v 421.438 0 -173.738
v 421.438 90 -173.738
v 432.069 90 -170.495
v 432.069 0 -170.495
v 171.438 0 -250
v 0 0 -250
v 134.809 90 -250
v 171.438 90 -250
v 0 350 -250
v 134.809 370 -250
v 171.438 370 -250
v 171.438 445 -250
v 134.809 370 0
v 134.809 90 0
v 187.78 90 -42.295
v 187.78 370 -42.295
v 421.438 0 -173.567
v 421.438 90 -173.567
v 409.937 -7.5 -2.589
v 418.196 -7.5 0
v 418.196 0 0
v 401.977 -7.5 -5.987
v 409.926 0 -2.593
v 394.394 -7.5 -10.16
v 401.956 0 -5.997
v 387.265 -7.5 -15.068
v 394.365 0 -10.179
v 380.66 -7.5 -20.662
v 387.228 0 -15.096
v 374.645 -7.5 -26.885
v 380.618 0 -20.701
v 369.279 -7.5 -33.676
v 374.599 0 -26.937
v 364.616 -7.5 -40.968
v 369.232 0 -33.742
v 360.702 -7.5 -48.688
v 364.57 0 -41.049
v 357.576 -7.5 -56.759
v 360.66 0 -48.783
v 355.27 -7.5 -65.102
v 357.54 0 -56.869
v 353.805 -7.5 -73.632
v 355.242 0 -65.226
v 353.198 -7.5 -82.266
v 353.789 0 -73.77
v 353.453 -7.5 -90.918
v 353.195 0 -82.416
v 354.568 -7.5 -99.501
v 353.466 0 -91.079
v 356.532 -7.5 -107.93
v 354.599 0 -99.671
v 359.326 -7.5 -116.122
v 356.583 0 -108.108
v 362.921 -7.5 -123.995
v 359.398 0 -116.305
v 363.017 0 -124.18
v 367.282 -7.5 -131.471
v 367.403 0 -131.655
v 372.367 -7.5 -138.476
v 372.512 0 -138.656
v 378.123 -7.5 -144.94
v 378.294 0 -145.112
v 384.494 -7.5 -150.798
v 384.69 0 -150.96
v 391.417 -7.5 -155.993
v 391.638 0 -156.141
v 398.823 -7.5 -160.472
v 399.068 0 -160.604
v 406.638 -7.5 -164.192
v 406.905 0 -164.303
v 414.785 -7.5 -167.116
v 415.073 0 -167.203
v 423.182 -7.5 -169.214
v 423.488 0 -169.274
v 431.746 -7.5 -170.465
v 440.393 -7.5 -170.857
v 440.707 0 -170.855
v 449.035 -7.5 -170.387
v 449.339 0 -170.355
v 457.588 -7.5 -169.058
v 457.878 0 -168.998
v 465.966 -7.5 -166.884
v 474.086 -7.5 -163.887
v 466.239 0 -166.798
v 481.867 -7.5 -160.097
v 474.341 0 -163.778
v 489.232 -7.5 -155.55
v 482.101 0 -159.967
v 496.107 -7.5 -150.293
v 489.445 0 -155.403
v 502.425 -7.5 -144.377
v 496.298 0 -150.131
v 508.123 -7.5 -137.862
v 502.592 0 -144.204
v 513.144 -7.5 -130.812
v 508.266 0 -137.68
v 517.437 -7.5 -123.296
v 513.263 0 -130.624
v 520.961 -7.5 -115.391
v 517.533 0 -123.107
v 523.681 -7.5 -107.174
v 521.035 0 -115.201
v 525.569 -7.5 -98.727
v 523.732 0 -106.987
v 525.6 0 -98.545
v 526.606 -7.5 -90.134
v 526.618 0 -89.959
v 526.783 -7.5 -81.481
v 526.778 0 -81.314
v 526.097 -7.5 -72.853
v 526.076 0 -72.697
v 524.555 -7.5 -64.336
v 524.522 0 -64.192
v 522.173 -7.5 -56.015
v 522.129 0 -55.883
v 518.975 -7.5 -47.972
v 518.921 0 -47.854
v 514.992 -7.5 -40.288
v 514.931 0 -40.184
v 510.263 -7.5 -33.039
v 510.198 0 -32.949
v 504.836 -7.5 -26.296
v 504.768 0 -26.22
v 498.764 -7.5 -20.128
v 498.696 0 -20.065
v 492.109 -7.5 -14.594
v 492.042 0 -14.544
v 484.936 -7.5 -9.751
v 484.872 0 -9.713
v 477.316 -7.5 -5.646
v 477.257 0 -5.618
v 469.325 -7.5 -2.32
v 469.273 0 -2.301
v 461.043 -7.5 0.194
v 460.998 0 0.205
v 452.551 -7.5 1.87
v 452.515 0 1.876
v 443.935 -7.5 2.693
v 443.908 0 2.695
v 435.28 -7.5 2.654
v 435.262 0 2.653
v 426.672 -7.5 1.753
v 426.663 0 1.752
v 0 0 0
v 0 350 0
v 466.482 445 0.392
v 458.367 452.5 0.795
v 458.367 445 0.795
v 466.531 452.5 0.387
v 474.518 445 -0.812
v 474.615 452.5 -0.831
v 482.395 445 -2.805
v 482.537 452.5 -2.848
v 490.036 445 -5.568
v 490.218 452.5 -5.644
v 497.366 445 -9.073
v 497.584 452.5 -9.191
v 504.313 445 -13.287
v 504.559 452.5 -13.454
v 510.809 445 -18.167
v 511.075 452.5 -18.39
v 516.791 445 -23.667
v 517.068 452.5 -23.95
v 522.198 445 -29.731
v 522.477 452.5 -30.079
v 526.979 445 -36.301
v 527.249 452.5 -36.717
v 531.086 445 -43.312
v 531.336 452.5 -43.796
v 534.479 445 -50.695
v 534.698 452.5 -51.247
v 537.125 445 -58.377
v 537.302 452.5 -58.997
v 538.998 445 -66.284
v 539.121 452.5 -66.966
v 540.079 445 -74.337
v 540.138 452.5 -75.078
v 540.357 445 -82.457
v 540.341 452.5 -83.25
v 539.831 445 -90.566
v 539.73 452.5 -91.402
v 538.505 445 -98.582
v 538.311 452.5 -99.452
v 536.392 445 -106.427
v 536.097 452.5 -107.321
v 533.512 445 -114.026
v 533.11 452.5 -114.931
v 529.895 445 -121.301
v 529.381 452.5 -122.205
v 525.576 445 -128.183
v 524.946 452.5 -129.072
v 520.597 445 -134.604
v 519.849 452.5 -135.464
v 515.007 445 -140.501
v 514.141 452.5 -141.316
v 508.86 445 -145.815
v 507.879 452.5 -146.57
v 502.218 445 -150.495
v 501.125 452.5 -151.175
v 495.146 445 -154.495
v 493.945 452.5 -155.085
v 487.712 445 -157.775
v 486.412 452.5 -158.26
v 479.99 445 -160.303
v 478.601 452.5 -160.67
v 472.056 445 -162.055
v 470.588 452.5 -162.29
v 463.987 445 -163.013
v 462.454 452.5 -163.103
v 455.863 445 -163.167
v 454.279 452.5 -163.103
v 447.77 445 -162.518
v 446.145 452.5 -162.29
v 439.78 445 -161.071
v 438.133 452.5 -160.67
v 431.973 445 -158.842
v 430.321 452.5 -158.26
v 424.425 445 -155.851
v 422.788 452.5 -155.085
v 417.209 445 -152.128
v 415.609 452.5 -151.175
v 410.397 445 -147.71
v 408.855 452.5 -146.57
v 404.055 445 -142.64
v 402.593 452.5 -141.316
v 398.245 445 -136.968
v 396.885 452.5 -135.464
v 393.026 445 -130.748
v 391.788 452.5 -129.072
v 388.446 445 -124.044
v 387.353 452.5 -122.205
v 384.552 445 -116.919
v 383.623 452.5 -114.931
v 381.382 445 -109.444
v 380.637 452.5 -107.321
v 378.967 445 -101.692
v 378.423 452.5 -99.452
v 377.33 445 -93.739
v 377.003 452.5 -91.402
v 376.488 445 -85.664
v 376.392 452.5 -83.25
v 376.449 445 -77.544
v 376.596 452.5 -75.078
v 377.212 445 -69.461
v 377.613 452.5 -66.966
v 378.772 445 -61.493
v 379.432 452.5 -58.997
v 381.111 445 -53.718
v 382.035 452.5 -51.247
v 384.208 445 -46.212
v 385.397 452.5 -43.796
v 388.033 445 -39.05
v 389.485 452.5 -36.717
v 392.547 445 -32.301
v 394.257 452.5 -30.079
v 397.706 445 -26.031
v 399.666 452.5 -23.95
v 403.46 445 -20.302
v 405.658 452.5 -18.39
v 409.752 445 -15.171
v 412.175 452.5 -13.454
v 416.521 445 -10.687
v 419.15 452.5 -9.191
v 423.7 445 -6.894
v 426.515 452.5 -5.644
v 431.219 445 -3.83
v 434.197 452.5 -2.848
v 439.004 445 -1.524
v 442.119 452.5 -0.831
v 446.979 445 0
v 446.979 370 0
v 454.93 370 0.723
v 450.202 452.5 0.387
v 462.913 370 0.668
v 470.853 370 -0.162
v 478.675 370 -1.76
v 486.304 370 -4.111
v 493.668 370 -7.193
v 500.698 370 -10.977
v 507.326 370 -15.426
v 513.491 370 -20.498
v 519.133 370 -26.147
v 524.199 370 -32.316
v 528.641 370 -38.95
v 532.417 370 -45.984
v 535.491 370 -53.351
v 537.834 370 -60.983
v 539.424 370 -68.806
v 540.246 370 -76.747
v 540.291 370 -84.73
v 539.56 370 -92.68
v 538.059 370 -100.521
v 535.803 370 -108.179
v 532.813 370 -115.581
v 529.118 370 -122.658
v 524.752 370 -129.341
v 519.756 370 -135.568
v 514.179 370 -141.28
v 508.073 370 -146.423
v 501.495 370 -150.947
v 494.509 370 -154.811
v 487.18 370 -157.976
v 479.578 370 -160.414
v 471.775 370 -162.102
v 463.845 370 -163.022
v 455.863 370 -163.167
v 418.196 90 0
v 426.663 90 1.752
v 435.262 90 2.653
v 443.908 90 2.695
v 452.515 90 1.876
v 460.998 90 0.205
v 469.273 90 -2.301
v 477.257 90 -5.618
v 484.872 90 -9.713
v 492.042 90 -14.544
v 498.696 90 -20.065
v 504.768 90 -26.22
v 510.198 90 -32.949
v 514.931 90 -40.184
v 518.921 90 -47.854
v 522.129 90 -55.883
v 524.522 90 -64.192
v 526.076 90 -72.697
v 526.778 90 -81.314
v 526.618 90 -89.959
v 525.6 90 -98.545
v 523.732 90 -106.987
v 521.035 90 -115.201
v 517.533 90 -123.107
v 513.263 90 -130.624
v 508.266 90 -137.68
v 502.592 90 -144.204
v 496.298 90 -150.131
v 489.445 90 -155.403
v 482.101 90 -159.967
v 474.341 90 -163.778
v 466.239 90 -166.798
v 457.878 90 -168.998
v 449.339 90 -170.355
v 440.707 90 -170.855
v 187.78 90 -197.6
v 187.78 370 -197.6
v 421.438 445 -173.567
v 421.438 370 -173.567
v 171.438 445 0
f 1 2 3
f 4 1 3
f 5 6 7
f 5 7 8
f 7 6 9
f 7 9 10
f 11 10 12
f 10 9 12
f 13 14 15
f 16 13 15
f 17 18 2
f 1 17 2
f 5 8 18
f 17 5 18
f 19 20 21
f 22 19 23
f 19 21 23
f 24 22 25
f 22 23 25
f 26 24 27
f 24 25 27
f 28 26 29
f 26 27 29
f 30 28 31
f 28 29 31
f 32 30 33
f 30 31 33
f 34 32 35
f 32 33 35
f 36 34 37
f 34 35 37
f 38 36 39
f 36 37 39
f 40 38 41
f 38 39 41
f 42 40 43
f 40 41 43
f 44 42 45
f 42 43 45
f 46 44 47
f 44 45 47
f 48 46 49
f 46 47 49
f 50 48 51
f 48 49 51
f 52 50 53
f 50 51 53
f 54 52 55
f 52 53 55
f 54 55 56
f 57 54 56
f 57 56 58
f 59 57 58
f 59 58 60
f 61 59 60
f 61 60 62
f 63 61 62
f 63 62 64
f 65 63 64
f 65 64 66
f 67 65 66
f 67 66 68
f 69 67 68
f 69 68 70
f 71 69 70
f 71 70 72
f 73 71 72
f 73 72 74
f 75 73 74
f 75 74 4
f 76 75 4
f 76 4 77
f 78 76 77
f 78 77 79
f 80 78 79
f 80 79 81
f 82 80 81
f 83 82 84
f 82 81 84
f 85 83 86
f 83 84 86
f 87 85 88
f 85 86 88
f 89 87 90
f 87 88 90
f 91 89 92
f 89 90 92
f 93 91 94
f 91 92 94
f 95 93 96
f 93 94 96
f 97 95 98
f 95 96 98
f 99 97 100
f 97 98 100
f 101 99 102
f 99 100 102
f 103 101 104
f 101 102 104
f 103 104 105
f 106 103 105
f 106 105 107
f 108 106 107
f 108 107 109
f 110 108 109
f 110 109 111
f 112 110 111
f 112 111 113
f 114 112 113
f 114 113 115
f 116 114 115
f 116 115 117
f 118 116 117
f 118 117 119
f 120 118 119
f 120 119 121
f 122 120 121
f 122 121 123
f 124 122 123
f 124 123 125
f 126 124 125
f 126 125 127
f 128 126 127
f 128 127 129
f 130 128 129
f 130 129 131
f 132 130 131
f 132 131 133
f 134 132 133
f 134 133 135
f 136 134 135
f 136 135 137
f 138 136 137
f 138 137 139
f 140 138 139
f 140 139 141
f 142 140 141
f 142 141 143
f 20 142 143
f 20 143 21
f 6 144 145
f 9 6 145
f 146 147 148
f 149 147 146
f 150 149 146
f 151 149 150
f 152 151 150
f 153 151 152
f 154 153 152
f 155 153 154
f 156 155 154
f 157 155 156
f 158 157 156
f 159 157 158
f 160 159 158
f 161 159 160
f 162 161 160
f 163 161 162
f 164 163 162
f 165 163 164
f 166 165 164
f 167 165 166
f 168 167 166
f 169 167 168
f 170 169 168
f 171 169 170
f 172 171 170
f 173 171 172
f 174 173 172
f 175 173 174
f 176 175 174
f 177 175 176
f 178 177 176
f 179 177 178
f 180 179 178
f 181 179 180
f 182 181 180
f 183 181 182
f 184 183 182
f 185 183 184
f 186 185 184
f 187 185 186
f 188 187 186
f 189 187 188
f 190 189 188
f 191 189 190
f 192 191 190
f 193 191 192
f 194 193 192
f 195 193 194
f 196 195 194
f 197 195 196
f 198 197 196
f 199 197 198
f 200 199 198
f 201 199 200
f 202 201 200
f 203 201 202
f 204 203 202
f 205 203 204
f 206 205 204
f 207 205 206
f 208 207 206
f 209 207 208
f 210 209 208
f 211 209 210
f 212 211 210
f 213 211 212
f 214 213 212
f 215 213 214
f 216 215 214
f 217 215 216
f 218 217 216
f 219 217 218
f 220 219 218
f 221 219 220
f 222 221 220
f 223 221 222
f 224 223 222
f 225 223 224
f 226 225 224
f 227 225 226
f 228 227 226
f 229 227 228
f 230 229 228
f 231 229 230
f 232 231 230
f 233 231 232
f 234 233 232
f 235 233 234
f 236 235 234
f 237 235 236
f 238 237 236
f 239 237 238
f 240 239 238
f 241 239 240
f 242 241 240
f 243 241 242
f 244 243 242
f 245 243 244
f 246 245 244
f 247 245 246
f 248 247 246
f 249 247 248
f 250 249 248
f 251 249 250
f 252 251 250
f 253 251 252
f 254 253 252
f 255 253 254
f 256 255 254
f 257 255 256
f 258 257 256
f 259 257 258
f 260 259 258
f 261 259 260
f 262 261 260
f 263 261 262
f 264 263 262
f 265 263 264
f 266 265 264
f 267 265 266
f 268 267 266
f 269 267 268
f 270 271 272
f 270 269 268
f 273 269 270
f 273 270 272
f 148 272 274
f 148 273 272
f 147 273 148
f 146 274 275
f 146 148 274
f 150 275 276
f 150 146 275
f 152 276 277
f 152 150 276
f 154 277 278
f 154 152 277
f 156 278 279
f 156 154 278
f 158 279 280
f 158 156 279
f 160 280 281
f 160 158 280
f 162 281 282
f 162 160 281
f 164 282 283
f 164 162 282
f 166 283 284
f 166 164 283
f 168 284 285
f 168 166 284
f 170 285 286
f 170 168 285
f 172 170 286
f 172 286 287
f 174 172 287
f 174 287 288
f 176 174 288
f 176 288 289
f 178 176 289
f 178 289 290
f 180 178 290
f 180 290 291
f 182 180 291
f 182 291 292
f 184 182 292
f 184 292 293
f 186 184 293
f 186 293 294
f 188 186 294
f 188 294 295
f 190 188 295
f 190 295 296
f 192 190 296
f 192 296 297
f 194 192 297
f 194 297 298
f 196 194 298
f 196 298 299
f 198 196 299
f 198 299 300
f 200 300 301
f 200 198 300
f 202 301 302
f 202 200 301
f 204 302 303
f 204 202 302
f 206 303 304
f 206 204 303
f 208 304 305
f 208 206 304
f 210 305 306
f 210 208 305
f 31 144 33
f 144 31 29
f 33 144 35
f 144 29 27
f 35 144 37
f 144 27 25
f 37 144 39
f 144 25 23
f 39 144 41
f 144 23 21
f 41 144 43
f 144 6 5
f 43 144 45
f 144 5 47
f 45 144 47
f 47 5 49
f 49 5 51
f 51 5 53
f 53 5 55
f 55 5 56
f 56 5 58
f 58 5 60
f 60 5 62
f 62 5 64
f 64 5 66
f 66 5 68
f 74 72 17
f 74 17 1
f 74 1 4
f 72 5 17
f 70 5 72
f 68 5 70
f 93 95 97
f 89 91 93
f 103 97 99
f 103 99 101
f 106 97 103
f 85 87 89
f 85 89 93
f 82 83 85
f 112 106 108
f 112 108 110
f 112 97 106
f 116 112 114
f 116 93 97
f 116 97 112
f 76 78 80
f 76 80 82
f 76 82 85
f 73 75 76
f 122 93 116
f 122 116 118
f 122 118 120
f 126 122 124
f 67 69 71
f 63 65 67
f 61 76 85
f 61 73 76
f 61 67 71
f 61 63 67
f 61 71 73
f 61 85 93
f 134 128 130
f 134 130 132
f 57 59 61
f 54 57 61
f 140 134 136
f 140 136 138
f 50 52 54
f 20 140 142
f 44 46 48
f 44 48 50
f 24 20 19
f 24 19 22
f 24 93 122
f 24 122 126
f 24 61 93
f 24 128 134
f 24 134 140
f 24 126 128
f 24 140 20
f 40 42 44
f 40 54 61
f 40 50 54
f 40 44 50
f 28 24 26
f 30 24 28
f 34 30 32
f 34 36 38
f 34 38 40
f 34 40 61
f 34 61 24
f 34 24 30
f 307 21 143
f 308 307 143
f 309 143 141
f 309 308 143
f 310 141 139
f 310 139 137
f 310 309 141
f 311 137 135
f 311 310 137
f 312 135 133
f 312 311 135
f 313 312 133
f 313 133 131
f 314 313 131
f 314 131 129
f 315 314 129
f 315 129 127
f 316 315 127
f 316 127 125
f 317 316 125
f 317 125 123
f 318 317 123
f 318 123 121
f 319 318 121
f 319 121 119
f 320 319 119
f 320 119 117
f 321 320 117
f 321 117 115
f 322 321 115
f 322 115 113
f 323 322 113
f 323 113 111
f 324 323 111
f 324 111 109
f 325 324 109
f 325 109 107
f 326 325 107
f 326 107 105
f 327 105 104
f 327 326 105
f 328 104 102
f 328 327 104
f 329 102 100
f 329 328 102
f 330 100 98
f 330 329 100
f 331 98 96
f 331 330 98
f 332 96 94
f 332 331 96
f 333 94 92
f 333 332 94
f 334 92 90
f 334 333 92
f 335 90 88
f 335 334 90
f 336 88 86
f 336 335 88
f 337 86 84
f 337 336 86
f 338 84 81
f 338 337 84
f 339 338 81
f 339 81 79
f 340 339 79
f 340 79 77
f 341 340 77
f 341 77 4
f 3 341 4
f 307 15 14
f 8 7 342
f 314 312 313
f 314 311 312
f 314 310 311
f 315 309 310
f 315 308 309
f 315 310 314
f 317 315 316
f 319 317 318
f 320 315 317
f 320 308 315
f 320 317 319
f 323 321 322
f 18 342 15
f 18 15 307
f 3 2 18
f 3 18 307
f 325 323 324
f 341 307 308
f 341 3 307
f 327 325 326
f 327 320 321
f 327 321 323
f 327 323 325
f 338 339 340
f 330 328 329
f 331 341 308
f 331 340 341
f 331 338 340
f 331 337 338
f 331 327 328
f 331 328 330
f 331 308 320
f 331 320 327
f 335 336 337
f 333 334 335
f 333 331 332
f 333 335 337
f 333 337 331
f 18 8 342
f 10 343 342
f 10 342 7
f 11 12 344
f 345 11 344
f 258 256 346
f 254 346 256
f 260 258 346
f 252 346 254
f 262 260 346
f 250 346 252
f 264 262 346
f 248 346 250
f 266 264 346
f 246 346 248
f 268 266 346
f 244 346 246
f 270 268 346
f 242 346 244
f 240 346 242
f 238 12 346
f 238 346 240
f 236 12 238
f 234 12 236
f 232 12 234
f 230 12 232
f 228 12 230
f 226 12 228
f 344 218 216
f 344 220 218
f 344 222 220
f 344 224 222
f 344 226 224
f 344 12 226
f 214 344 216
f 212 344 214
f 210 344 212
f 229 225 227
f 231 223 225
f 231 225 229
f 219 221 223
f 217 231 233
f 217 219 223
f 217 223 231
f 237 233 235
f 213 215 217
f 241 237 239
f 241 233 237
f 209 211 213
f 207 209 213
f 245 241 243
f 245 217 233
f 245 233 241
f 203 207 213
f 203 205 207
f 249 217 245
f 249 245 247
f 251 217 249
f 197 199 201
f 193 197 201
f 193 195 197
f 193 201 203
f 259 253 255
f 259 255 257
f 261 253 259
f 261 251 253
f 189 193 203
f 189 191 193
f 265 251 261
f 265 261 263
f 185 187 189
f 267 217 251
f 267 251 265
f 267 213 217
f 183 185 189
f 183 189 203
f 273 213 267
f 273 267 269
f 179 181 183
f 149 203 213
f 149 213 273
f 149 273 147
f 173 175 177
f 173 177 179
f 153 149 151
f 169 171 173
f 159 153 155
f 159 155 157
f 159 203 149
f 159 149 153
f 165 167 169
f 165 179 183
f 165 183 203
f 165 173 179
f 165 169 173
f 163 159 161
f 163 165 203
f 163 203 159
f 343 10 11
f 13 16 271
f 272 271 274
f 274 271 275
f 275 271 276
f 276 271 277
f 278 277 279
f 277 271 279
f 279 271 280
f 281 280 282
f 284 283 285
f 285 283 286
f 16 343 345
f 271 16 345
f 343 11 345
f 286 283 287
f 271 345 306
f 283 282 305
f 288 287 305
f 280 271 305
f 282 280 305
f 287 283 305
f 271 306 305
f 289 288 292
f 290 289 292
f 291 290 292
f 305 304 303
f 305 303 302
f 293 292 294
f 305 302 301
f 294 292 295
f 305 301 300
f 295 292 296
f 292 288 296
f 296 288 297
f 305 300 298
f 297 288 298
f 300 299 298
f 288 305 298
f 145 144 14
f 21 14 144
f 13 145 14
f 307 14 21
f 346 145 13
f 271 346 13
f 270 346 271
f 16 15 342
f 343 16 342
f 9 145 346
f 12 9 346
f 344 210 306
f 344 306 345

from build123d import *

# Parameters (mm, degrees)
BOSS_EXTRUDE1_DEPTH = 250
SKETCH3_W           = 80
SKETCH3_H           = 90
BOSS_EXTRUDE3_DEPTH = 250
CUT_EXTRUDE1_DEPTH  = 500
CUT_EXTRUDE2_DEPTH  = 500
BOSS_EXTRUDE4_DEPTH = 75
SKETCH7_R           = 82
BOSS_EXTRUDE5_DEPTH = 75
SKETCH8_R           = 86.820358575
BOSS_EXTRUDE6_DEPTH = 90
BOSS_EXTRUDE7_START = 7.5
SKETCH9_R           = 82
BOSS_EXTRUDE7_DEPTH = 7.5
SKETCH10_R          = 86.820358575
BOSS_EXTRUDE8_DEPTH = 7.5
BOSS_EXTRUDE9_DEPTH = 280


with BuildPart() as part:
    # Sketch2 → Boss-Extrude1 (new body)
    with BuildSketch(Plane.XY):
        Polygon((0, 0), (0, 350), (171.438035453, 445), (421.438035453, 445), (421.438035453, 370), (134.808708212, 370), (134.808708212, 90), (360, 90), (360, 0), align=None)
    extrude(amount=-BOSS_EXTRUDE1_DEPTH)

    # Sketch3 → Boss-Extrude3 (add)
    with BuildSketch(Plane.XY):
        with Locations((400, 45)):
            Rectangle(SKETCH3_W, SKETCH3_H)
    extrude(amount=-BOSS_EXTRUDE3_DEPTH)

    # Sketch4 → Cut-Extrude1 (cut)
    with BuildSketch(Plane(origin=(0, 445, 0), x_dir=(1, 0, 0), z_dir=(0, 1, 0))):
        Polygon((171.438035453, 250), (421.438035453, 173.567329635), (421.438035453, 250), align=None)
    extrude(amount=-CUT_EXTRUDE1_DEPTH, mode=Mode.SUBTRACT)

    # Sketch5 → Cut-Extrude2 (cut)
    with BuildSketch(Plane(origin=(0, 90, 0), x_dir=(1, 0, 0), z_dir=(0, 1, 0))):
        Polygon((171.438035453, 250), (529.292603831, 140.837226457), (529.292603831, 329.490615835), align=None)
    extrude(amount=-CUT_EXTRUDE2_DEPTH, mode=Mode.SUBTRACT)

    # Sketch6 → Boss-Extrude4 (add)
    with BuildSketch(Plane(origin=(0, 445, 0), x_dir=(1, 0, 0), z_dir=(0, 1, 0))):
        Polygon((458.366845574, 162.410857278), (421.438035453, 173.567329635), (419.282590182, 0), (458.366845574, 0), align=None)
    extrude(amount=-BOSS_EXTRUDE4_DEPTH)

    # Sketch7 → Boss-Extrude5 (add)
    with BuildSketch(Plane(origin=(0, 445, 0), x_dir=(1, 0, 0), z_dir=(0, 1, 0))):
        with Locations((458.366845574, 81.205428639)):
            Circle(SKETCH7_R)
    extrude(amount=-BOSS_EXTRUDE5_DEPTH)

    # Sketch8 → Boss-Extrude6 (add)
    with BuildSketch(Plane(origin=(0, 90, 0), x_dir=(1, 0, 0), z_dir=(0, 1, 0))):
        with Locations((440, 84.037872492)):
            Circle(SKETCH8_R)
    extrude(amount=-BOSS_EXTRUDE6_DEPTH)

    # Sketch9 → Boss-Extrude7 (add)
    with BuildSketch(Plane(origin=(0, 445, 0), x_dir=(1, 0, 0), z_dir=(0, 1, 0)).offset(BOSS_EXTRUDE7_START)):
        with Locations(Location((458.366845574, 81.205428639, 0), (0, 0, 270))):
            Circle(SKETCH9_R)
    extrude(amount=-BOSS_EXTRUDE7_DEPTH)

    # Sketch10 → Boss-Extrude8 (add)
    with BuildSketch(Plane.XZ):
        with Locations(Location((440, -84.037872492, 0), (0, 0, 104.544878668))):
            Circle(SKETCH10_R)
    extrude(amount=BOSS_EXTRUDE8_DEPTH)

    # Sketch11 → Boss-Extrude9 (add)
    with BuildSketch(Plane(origin=(0, 90, 0), x_dir=(1, 0, 0), z_dir=(0, 1, 0))):
        Polygon((134.808708212, 0), (187.780197763, 42.295296089), (187.780197763, 197.600080779), (134.808708212, 250), align=None)
    extrude(amount=BOSS_EXTRUDE9_DEPTH)


solid = part.part
